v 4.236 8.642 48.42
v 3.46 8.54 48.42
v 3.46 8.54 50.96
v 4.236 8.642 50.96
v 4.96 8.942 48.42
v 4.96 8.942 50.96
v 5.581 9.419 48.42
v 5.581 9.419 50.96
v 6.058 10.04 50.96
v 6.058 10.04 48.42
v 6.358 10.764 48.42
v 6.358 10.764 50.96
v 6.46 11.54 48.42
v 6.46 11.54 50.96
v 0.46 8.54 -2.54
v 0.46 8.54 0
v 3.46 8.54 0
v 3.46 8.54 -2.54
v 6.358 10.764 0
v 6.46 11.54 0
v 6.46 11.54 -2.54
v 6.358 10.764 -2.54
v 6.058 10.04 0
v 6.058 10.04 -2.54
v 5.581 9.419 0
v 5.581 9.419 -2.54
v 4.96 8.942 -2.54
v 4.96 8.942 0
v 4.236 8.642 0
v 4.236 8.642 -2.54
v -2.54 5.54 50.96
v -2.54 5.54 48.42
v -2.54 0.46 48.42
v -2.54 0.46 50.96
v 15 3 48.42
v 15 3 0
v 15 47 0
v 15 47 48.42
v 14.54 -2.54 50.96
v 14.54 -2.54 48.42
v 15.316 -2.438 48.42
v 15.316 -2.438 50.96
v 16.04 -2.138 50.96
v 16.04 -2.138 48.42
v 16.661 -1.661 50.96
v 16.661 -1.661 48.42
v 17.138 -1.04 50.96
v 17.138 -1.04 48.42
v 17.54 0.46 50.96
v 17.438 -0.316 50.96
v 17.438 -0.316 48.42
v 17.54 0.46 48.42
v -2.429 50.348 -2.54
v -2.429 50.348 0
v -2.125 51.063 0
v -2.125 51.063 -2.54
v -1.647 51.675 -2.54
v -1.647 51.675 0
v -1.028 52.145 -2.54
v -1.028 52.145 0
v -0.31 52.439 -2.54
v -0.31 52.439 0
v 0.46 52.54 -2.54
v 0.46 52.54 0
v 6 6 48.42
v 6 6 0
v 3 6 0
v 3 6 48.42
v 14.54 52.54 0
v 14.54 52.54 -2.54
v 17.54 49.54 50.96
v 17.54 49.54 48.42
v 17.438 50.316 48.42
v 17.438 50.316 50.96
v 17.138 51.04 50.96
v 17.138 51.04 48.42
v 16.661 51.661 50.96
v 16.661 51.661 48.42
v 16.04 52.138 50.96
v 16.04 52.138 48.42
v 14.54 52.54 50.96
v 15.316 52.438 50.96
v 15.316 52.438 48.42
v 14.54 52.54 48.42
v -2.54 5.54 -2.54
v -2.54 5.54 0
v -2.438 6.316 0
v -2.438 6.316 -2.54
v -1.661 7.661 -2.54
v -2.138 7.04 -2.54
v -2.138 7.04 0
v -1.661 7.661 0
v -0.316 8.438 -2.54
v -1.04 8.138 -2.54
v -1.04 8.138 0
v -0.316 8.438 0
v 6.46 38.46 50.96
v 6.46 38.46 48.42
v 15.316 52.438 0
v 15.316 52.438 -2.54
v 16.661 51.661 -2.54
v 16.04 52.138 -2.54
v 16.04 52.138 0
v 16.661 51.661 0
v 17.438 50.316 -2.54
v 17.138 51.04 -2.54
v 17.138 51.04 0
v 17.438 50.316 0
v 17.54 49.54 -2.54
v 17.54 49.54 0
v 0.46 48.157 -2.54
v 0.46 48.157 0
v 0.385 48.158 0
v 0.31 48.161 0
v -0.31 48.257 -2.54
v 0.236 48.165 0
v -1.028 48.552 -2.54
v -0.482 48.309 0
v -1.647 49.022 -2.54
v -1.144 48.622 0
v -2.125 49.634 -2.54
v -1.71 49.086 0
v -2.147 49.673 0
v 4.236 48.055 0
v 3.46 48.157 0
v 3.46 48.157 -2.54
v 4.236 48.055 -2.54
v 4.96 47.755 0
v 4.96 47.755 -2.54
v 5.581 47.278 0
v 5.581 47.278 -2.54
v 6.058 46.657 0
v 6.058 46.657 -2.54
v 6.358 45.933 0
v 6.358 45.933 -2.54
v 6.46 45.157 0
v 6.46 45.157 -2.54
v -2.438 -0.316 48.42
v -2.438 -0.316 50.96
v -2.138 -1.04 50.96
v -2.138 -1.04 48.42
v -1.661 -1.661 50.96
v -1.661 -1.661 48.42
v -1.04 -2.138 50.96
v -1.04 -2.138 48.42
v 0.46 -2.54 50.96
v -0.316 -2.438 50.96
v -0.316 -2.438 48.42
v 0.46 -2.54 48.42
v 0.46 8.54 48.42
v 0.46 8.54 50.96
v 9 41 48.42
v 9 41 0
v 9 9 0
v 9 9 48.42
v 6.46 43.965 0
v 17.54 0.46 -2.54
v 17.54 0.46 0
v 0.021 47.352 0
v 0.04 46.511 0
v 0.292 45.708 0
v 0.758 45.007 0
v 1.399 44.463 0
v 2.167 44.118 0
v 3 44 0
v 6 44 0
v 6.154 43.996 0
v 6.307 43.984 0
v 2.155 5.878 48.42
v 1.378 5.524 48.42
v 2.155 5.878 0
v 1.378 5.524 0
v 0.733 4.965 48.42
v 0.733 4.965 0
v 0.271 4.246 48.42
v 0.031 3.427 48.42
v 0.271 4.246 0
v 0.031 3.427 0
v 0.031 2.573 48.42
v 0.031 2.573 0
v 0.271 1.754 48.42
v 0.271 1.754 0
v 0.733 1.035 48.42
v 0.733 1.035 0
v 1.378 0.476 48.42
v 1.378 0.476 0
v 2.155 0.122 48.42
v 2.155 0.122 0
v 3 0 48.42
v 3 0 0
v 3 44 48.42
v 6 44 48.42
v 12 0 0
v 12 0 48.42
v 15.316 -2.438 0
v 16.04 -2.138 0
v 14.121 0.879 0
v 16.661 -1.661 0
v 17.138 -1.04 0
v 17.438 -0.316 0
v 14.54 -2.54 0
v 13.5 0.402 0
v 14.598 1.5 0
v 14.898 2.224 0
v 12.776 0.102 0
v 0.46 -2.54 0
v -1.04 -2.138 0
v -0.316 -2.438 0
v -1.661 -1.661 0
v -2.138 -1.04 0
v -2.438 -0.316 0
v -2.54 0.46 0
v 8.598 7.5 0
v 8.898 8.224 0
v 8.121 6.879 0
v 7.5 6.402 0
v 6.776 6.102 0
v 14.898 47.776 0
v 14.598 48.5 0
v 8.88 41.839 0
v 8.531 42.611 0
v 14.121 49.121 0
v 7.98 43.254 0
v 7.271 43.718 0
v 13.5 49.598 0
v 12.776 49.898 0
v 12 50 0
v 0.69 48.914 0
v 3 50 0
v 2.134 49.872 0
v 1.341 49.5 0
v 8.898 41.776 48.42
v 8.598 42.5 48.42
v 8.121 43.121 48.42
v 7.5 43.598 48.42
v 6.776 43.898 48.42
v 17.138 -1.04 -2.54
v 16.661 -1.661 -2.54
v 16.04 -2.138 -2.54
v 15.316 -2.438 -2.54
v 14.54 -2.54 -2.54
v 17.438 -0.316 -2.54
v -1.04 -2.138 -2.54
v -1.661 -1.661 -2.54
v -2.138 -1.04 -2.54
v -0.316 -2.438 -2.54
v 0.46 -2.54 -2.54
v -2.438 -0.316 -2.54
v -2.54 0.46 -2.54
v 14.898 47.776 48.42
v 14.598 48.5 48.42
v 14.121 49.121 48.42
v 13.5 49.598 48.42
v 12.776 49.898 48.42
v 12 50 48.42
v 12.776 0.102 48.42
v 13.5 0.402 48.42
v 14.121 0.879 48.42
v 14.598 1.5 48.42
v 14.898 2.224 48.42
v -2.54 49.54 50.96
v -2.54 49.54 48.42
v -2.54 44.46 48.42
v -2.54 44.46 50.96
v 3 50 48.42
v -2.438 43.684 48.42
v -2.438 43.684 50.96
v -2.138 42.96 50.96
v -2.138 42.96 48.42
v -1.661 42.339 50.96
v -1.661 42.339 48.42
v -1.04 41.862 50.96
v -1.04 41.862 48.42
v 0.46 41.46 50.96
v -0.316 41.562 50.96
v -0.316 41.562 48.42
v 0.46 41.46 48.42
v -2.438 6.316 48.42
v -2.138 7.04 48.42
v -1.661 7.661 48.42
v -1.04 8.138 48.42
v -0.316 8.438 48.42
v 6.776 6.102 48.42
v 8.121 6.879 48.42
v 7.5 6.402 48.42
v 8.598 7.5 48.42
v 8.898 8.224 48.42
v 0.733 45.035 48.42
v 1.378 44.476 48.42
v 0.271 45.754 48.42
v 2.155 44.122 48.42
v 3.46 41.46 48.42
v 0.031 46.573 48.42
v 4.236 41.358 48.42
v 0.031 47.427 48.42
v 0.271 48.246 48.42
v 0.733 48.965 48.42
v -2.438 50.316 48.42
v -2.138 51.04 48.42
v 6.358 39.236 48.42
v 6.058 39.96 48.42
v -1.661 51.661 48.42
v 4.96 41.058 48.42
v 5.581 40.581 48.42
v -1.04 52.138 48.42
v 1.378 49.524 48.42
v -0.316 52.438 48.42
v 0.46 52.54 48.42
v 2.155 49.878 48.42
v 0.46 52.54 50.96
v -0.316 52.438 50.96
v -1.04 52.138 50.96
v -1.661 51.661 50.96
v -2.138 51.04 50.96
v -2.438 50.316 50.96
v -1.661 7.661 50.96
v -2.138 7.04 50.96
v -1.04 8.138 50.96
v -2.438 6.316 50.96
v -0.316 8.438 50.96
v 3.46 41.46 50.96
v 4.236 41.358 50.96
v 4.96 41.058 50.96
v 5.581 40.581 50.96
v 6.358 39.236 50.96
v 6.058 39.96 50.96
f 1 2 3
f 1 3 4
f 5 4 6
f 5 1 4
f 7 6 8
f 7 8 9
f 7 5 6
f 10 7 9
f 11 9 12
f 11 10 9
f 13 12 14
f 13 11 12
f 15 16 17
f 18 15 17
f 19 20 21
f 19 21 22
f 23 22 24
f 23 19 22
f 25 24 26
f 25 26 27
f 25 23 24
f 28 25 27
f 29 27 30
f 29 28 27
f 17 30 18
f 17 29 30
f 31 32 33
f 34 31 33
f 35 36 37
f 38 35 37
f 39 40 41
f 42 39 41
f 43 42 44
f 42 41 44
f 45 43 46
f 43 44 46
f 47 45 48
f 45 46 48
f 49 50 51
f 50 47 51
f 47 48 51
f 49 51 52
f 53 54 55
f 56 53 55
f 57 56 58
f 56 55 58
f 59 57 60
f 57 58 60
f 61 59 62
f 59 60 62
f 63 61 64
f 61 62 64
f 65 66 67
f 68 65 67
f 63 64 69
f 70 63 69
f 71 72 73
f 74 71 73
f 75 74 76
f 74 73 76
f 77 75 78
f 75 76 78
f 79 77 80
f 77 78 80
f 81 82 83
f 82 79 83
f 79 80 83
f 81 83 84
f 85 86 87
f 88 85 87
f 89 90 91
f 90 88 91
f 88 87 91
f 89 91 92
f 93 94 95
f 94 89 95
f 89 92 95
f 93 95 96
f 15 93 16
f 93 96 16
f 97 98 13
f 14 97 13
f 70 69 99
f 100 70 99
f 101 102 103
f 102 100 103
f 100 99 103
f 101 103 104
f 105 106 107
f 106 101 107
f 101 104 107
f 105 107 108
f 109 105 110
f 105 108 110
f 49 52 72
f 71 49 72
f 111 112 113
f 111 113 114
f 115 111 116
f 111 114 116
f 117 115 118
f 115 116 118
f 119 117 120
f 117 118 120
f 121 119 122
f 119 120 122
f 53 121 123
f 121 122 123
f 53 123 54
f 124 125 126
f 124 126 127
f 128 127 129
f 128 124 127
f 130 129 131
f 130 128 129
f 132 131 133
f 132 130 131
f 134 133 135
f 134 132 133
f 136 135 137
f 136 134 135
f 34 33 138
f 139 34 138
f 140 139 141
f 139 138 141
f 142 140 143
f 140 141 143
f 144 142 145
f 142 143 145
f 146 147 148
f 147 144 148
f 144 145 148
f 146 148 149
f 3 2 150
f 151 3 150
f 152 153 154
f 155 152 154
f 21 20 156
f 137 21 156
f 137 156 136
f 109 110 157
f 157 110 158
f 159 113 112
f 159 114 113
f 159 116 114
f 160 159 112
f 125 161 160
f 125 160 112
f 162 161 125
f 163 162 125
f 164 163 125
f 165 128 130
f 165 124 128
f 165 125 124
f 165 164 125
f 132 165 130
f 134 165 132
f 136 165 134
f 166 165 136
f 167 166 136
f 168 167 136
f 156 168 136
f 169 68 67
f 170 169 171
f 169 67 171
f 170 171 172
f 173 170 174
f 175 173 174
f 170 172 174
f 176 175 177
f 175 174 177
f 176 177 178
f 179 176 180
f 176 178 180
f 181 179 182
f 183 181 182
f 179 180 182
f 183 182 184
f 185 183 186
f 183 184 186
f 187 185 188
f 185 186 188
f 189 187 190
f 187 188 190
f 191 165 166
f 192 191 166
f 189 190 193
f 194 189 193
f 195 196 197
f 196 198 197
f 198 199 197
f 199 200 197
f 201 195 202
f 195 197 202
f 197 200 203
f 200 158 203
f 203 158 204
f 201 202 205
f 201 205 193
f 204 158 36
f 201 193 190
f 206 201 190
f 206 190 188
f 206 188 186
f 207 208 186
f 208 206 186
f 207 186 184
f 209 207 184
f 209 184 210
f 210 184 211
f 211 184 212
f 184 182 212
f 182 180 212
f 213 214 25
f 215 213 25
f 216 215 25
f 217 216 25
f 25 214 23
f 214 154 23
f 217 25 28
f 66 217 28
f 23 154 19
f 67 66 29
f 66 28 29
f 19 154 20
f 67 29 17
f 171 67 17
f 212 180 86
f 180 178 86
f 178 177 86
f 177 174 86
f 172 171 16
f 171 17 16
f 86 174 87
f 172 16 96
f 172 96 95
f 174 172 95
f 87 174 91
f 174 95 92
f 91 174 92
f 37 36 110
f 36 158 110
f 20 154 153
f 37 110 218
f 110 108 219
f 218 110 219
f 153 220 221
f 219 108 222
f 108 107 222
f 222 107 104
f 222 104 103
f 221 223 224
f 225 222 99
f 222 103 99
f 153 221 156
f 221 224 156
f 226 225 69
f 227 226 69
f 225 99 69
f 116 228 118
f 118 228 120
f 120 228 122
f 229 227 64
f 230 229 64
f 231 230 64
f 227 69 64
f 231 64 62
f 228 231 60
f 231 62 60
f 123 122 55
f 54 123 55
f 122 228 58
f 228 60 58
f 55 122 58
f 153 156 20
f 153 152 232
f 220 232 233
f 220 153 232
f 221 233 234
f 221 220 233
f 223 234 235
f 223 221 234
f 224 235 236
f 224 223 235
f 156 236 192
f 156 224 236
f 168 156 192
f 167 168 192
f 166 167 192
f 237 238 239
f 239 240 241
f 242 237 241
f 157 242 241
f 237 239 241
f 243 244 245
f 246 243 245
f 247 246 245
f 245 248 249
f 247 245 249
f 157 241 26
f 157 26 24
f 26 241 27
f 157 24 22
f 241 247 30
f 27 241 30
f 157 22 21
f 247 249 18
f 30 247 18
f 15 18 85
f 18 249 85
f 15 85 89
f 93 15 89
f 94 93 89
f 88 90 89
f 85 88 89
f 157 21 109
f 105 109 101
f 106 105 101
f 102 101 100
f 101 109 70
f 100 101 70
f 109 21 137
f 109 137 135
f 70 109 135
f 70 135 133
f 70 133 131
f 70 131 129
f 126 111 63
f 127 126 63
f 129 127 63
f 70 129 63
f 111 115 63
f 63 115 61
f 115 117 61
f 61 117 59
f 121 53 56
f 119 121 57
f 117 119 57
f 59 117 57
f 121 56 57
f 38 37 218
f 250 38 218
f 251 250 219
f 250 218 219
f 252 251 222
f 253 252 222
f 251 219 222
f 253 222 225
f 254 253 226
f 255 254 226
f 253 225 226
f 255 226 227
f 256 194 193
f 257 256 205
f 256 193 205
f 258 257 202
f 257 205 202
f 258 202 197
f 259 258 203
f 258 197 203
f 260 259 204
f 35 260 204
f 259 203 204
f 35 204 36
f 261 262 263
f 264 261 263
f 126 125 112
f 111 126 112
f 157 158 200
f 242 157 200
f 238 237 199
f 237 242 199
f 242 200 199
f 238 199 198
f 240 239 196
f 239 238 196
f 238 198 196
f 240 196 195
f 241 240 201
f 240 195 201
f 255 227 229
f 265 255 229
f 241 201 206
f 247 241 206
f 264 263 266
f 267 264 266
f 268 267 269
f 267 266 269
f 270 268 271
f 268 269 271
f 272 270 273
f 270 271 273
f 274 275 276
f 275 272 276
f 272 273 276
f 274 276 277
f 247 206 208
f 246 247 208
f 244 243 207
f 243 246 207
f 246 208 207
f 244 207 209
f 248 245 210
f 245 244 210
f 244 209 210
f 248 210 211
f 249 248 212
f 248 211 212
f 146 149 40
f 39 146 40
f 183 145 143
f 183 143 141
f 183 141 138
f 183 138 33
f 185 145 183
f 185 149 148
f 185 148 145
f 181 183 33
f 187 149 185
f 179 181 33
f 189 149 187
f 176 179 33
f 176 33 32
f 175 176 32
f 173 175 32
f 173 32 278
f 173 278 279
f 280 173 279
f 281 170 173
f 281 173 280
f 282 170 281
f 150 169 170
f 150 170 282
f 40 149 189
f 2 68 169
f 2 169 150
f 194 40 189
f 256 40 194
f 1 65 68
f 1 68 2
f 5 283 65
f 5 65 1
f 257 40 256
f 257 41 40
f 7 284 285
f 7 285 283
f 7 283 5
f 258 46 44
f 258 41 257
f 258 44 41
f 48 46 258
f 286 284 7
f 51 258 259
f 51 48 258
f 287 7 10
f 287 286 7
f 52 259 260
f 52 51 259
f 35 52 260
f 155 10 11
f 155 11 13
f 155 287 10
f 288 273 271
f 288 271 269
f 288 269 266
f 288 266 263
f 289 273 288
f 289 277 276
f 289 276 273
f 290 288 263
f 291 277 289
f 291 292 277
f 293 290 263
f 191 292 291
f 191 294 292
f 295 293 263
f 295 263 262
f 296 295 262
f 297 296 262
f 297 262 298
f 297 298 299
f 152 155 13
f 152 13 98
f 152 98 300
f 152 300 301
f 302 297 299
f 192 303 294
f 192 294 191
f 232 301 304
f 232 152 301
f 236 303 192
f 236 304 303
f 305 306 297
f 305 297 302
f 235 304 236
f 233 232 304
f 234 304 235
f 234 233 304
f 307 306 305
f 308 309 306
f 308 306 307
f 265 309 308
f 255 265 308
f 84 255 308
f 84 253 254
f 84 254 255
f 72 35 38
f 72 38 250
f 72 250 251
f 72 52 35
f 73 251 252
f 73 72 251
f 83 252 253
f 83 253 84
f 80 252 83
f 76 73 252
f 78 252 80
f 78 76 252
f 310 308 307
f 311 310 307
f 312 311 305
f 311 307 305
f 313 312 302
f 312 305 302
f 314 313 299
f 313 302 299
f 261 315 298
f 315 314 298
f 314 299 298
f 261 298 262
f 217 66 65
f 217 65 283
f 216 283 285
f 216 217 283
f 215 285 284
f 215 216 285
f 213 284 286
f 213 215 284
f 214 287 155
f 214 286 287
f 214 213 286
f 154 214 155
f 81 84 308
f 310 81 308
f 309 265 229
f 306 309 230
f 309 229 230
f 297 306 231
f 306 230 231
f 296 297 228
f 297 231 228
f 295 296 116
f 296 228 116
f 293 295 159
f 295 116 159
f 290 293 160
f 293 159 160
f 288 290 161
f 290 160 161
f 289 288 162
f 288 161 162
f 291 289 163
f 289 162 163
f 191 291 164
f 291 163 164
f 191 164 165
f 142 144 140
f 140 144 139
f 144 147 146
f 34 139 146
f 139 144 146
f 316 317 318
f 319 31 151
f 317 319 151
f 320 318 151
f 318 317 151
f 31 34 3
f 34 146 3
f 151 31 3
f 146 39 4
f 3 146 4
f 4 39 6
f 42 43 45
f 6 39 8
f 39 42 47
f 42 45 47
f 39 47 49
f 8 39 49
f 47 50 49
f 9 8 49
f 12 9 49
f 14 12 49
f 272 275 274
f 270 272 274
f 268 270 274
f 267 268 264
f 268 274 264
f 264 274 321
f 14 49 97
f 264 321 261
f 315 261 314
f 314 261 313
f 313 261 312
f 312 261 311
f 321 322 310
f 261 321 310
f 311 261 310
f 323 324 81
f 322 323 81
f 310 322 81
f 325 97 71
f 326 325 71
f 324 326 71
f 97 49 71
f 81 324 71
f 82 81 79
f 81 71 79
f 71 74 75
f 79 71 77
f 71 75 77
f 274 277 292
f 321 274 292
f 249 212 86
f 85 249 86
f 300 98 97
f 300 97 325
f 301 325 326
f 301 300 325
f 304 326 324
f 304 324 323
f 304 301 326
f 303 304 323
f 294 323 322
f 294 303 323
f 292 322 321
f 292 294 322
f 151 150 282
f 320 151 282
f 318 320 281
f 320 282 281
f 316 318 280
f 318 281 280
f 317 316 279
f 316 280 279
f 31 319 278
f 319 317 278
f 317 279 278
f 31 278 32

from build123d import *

# Parameters (mm, degrees)
BOSS_EXTRUDE1_DEPTH = 48.42
BOSS_EXTRUDE2_DEPTH = 2.54
BOSS_EXTRUDE3_DEPTH = 2.54
FILLET4_R           = 3
FILLET5_R           = 3


with BuildPart() as part:
    # Sketch1 → Boss-Extrude1 (new body)
    with BuildSketch(Plane.XY):
        Polygon((0, 6), (0, 0), (15, 0), (15, 46.604118993), (15, 50), (0, 50), (0, 44), (9, 44), (9, 6), align=None)
    extrude(amount=BOSS_EXTRUDE1_DEPTH)

    # Sketch2 → Boss-Extrude2 (add)
    with BuildSketch(Plane.XY.offset(48.42)):
        Polygon((-2.54, 41.46), (6.46, 41.46), (6.46, 8.54), (-2.54, 8.54), (-2.54, -2.54), (17.54, -2.54), (17.54, 52.54), (-2.54, 52.54), align=None)
    extrude(amount=BOSS_EXTRUDE2_DEPTH)

    # Sketch3 → Boss-Extrude3 (add)
    with BuildSketch(Plane(origin=(0, 0, 0), x_dir=(-1, 0, 0), z_dir=(0, 0, -1))):
        Polygon((2.54, 52.54), (-17.54, 52.54), (-17.54, 48.156890446), (-17.54, -2.54), (-6.46, -2.54), (2.54, -2.54), (2.54, 8.54), (-6.46, 8.54), (-6.46, 48.156890446), (2.54, 48.156890446), align=None)
    extrude(amount=BOSS_EXTRUDE3_DEPTH)

    # Fillet4
    # the kernel refuses this fillet: 3 mm, written as the material it adds along each edge
    with BuildSketch(Plane(origin=(9, 6, -7.5), x_dir=(0, 1, 0), z_dir=(0, 0, 1))) as fillet4_piece_1_section:
        with BuildLine():
            CenterArc((FILLET4_R, FILLET4_R), FILLET4_R, 180, 90)
            Line((0, FILLET4_R), (0, 0))
            Line((0, 0), (FILLET4_R, 0))
        make_face()
    fillet4_piece_1 = extrude(amount=63.42, mode=Mode.PRIVATE)
    fillet4_piece_1 = split(fillet4_piece_1, bisect_by=Plane(origin=(8.329896183, 6.670103817, 50.96), z_dir=(0, 0, -1)), keep=Keep.TOP, mode=Mode.PRIVATE)
    fillet4_piece_1 = split(fillet4_piece_1, bisect_by=Plane(origin=(8.329896183, 6.670103817, -2.54), z_dir=(0, 0, 1)), keep=Keep.TOP, mode=Mode.PRIVATE)
    add(fillet4_piece_1)
    with BuildSketch(Plane(origin=(9, 44, 0), x_dir=(-1, 0, 0), z_dir=(0, 0, 1))) as fillet4_piece_2_section:
        with BuildLine():
            CenterArc((FILLET4_R, FILLET4_R), FILLET4_R, 180, 90)
            Line((0, FILLET4_R), (0, 0))
            Line((0, 0), (FILLET4_R, 0))
        make_face()
    fillet4_piece_2 = extrude(amount=55.92, mode=Mode.PRIVATE)
    fillet4_piece_2 = split(fillet4_piece_2, bisect_by=Plane(origin=(6.34513643, 43.989367947, 50.96), z_dir=(0, 0, -1)), keep=Keep.TOP, mode=Mode.PRIVATE)
    add(fillet4_piece_2)
    # the kernel refuses this fillet: 3 mm, written as the material it takes off along each edge
    with BuildSketch(Plane(origin=(0, 6, 0), x_dir=(0, -1, 0), z_dir=(0, 0, 1)), Plane(origin=(15, 0, 0), x_dir=(0, 1, 0), z_dir=(0, 0, 1)), Plane(origin=(0, 0, 0), x_dir=(1, 0, 0), z_dir=(0, 0, 1)), Plane(origin=(0, 50, 0), x_dir=(0, -1, 0), z_dir=(0, 0, 1))) as fillet4_2_piece_1:
        with BuildLine():
            CenterArc((FILLET4_R, FILLET4_R), FILLET4_R, 180, 90)
            Line((0, FILLET4_R), (0, 0))
            Line((0, 0), (FILLET4_R, 0))
        make_face()
    extrude(amount=48.42, mode=Mode.SUBTRACT)
    with BuildSketch(Plane(origin=(15, 50, 0), x_dir=(0, -1, 0), z_dir=(0, 0, 1))) as fillet4_2_piece_2:
        with BuildLine():
            CenterArc((FILLET4_R, -FILLET4_R), FILLET4_R, 90, 90)
            Line((0, -FILLET4_R), (0, 0))
            Line((0, 0), (FILLET4_R, 0))
        make_face()
    extrude(amount=48.42, mode=Mode.SUBTRACT)
    with BuildSketch(Plane(origin=(0, 44, -7.5), x_dir=(1, 0, 0), z_dir=(0, 0, 1))) as fillet4_2_piece_3:
        with BuildLine():
            CenterArc((FILLET4_R, FILLET4_R), FILLET4_R, 180, 90)
            Line((0, FILLET4_R), (0, 0))
            Line((0, 0), (FILLET4_R, 0))
        make_face()
    extrude(amount=55.92, mode=Mode.SUBTRACT)

    # Fillet5
    # the kernel refuses this fillet: 3 mm, written as the material it adds along each edge
    with BuildSketch(Plane(origin=(6.46, 41.46, 48.42), x_dir=(0, -1, 0), z_dir=(0, 0, 1)), Plane(origin=(6.46, 8.54, 48.42), x_dir=(-1, 0, 0), z_dir=(0, 0, 1)), Plane(origin=(6.46, 8.54, 0), x_dir=(0, 1, 0), z_dir=(0, 0, -1))) as fillet5_piece_1:
        with BuildLine():
            CenterArc((FILLET5_R, -FILLET5_R), FILLET5_R, 90, 90)
            Line((0, -FILLET5_R), (0, 0))
            Line((0, 0), (FILLET5_R, 0))
        make_face()
    extrude(amount=2.54)
    with BuildSketch(Plane(origin=(6.46, 48.156890446, 7.5), x_dir=(0, -1, 0), z_dir=(0, 0, -1))) as fillet5_piece_2:
        with BuildLine():
            CenterArc((FILLET5_R, FILLET5_R), FILLET5_R, 180, 90)
            Line((0, FILLET5_R), (0, 0))
            Line((0, 0), (FILLET5_R, 0))
        make_face()
    extrude(amount=10.04)
    # the kernel refuses this fillet: 3 mm, written as the material it takes off along each edge
    with BuildSketch(Plane(origin=(-2.54, 52.54, 40.92), x_dir=(1, 0, 0), z_dir=(0, 0, 1)), Plane(origin=(-2.54, 8.54, 40.92), x_dir=(1, 0, 0), z_dir=(0, 0, 1)), Plane(origin=(-2.54, -2.54, 40.92), x_dir=(0, 1, 0), z_dir=(0, 0, 1)), Plane(origin=(17.54, -2.54, 40.92), x_dir=(-1, 0, 0), z_dir=(0, 0, 1)), Plane(origin=(17.54, 52.54, 40.92), x_dir=(0, -1, 0), z_dir=(0, 0, 1)), Plane(origin=(-2.54, 52.54, 7.5), x_dir=(0, -1, 0), z_dir=(0, 0, -1)), Plane(origin=(17.54, 52.54, 7.5), x_dir=(-1, 0, 0), z_dir=(0, 0, -1)), Plane(origin=(17.54, -2.54, 7.5), x_dir=(0, 1, 0), z_dir=(0, 0, -1)), Plane(origin=(-2.54, -2.54, 7.5), x_dir=(1, 0, 0), z_dir=(0, 0, -1)), Plane(origin=(-2.54, 8.54, 7.5), x_dir=(0, -1, 0), z_dir=(0, 0, -1))) as fillet5_2_piece_1:
        with BuildLine():
            CenterArc((FILLET5_R, -FILLET5_R), FILLET5_R, 90, 90)
            Line((0, -FILLET5_R), (0, 0))
            Line((0, 0), (FILLET5_R, 0))
        make_face()
    extrude(amount=17.54, mode=Mode.SUBTRACT)
    with BuildSketch(Plane(origin=(-2.54, 41.46, 40.92), x_dir=(1, 0, 0), z_dir=(0, 0, 1))) as fillet5_2_piece_2:
        with BuildLine():
            CenterArc((FILLET5_R, FILLET5_R), FILLET5_R, 180, 90)
            Line((0, FILLET5_R), (0, 0))
            Line((0, 0), (FILLET5_R, 0))
        make_face()
    extrude(amount=17.54, mode=Mode.SUBTRACT)
    with BuildSketch(Plane(origin=(-2.54, 48.156890446, 0), x_dir=(1, 0, 0), z_dir=(0, 0, -1))) as fillet5_2_piece_3:
        with BuildLine():
            CenterArc((FILLET5_R, -FILLET5_R), FILLET5_R, 90, 90)
            Line((0, -FILLET5_R), (0, 0))
            Line((0, 0), (FILLET5_R, 0))
        make_face()
    extrude(amount=10.04, mode=Mode.SUBTRACT)


solid = part.part
